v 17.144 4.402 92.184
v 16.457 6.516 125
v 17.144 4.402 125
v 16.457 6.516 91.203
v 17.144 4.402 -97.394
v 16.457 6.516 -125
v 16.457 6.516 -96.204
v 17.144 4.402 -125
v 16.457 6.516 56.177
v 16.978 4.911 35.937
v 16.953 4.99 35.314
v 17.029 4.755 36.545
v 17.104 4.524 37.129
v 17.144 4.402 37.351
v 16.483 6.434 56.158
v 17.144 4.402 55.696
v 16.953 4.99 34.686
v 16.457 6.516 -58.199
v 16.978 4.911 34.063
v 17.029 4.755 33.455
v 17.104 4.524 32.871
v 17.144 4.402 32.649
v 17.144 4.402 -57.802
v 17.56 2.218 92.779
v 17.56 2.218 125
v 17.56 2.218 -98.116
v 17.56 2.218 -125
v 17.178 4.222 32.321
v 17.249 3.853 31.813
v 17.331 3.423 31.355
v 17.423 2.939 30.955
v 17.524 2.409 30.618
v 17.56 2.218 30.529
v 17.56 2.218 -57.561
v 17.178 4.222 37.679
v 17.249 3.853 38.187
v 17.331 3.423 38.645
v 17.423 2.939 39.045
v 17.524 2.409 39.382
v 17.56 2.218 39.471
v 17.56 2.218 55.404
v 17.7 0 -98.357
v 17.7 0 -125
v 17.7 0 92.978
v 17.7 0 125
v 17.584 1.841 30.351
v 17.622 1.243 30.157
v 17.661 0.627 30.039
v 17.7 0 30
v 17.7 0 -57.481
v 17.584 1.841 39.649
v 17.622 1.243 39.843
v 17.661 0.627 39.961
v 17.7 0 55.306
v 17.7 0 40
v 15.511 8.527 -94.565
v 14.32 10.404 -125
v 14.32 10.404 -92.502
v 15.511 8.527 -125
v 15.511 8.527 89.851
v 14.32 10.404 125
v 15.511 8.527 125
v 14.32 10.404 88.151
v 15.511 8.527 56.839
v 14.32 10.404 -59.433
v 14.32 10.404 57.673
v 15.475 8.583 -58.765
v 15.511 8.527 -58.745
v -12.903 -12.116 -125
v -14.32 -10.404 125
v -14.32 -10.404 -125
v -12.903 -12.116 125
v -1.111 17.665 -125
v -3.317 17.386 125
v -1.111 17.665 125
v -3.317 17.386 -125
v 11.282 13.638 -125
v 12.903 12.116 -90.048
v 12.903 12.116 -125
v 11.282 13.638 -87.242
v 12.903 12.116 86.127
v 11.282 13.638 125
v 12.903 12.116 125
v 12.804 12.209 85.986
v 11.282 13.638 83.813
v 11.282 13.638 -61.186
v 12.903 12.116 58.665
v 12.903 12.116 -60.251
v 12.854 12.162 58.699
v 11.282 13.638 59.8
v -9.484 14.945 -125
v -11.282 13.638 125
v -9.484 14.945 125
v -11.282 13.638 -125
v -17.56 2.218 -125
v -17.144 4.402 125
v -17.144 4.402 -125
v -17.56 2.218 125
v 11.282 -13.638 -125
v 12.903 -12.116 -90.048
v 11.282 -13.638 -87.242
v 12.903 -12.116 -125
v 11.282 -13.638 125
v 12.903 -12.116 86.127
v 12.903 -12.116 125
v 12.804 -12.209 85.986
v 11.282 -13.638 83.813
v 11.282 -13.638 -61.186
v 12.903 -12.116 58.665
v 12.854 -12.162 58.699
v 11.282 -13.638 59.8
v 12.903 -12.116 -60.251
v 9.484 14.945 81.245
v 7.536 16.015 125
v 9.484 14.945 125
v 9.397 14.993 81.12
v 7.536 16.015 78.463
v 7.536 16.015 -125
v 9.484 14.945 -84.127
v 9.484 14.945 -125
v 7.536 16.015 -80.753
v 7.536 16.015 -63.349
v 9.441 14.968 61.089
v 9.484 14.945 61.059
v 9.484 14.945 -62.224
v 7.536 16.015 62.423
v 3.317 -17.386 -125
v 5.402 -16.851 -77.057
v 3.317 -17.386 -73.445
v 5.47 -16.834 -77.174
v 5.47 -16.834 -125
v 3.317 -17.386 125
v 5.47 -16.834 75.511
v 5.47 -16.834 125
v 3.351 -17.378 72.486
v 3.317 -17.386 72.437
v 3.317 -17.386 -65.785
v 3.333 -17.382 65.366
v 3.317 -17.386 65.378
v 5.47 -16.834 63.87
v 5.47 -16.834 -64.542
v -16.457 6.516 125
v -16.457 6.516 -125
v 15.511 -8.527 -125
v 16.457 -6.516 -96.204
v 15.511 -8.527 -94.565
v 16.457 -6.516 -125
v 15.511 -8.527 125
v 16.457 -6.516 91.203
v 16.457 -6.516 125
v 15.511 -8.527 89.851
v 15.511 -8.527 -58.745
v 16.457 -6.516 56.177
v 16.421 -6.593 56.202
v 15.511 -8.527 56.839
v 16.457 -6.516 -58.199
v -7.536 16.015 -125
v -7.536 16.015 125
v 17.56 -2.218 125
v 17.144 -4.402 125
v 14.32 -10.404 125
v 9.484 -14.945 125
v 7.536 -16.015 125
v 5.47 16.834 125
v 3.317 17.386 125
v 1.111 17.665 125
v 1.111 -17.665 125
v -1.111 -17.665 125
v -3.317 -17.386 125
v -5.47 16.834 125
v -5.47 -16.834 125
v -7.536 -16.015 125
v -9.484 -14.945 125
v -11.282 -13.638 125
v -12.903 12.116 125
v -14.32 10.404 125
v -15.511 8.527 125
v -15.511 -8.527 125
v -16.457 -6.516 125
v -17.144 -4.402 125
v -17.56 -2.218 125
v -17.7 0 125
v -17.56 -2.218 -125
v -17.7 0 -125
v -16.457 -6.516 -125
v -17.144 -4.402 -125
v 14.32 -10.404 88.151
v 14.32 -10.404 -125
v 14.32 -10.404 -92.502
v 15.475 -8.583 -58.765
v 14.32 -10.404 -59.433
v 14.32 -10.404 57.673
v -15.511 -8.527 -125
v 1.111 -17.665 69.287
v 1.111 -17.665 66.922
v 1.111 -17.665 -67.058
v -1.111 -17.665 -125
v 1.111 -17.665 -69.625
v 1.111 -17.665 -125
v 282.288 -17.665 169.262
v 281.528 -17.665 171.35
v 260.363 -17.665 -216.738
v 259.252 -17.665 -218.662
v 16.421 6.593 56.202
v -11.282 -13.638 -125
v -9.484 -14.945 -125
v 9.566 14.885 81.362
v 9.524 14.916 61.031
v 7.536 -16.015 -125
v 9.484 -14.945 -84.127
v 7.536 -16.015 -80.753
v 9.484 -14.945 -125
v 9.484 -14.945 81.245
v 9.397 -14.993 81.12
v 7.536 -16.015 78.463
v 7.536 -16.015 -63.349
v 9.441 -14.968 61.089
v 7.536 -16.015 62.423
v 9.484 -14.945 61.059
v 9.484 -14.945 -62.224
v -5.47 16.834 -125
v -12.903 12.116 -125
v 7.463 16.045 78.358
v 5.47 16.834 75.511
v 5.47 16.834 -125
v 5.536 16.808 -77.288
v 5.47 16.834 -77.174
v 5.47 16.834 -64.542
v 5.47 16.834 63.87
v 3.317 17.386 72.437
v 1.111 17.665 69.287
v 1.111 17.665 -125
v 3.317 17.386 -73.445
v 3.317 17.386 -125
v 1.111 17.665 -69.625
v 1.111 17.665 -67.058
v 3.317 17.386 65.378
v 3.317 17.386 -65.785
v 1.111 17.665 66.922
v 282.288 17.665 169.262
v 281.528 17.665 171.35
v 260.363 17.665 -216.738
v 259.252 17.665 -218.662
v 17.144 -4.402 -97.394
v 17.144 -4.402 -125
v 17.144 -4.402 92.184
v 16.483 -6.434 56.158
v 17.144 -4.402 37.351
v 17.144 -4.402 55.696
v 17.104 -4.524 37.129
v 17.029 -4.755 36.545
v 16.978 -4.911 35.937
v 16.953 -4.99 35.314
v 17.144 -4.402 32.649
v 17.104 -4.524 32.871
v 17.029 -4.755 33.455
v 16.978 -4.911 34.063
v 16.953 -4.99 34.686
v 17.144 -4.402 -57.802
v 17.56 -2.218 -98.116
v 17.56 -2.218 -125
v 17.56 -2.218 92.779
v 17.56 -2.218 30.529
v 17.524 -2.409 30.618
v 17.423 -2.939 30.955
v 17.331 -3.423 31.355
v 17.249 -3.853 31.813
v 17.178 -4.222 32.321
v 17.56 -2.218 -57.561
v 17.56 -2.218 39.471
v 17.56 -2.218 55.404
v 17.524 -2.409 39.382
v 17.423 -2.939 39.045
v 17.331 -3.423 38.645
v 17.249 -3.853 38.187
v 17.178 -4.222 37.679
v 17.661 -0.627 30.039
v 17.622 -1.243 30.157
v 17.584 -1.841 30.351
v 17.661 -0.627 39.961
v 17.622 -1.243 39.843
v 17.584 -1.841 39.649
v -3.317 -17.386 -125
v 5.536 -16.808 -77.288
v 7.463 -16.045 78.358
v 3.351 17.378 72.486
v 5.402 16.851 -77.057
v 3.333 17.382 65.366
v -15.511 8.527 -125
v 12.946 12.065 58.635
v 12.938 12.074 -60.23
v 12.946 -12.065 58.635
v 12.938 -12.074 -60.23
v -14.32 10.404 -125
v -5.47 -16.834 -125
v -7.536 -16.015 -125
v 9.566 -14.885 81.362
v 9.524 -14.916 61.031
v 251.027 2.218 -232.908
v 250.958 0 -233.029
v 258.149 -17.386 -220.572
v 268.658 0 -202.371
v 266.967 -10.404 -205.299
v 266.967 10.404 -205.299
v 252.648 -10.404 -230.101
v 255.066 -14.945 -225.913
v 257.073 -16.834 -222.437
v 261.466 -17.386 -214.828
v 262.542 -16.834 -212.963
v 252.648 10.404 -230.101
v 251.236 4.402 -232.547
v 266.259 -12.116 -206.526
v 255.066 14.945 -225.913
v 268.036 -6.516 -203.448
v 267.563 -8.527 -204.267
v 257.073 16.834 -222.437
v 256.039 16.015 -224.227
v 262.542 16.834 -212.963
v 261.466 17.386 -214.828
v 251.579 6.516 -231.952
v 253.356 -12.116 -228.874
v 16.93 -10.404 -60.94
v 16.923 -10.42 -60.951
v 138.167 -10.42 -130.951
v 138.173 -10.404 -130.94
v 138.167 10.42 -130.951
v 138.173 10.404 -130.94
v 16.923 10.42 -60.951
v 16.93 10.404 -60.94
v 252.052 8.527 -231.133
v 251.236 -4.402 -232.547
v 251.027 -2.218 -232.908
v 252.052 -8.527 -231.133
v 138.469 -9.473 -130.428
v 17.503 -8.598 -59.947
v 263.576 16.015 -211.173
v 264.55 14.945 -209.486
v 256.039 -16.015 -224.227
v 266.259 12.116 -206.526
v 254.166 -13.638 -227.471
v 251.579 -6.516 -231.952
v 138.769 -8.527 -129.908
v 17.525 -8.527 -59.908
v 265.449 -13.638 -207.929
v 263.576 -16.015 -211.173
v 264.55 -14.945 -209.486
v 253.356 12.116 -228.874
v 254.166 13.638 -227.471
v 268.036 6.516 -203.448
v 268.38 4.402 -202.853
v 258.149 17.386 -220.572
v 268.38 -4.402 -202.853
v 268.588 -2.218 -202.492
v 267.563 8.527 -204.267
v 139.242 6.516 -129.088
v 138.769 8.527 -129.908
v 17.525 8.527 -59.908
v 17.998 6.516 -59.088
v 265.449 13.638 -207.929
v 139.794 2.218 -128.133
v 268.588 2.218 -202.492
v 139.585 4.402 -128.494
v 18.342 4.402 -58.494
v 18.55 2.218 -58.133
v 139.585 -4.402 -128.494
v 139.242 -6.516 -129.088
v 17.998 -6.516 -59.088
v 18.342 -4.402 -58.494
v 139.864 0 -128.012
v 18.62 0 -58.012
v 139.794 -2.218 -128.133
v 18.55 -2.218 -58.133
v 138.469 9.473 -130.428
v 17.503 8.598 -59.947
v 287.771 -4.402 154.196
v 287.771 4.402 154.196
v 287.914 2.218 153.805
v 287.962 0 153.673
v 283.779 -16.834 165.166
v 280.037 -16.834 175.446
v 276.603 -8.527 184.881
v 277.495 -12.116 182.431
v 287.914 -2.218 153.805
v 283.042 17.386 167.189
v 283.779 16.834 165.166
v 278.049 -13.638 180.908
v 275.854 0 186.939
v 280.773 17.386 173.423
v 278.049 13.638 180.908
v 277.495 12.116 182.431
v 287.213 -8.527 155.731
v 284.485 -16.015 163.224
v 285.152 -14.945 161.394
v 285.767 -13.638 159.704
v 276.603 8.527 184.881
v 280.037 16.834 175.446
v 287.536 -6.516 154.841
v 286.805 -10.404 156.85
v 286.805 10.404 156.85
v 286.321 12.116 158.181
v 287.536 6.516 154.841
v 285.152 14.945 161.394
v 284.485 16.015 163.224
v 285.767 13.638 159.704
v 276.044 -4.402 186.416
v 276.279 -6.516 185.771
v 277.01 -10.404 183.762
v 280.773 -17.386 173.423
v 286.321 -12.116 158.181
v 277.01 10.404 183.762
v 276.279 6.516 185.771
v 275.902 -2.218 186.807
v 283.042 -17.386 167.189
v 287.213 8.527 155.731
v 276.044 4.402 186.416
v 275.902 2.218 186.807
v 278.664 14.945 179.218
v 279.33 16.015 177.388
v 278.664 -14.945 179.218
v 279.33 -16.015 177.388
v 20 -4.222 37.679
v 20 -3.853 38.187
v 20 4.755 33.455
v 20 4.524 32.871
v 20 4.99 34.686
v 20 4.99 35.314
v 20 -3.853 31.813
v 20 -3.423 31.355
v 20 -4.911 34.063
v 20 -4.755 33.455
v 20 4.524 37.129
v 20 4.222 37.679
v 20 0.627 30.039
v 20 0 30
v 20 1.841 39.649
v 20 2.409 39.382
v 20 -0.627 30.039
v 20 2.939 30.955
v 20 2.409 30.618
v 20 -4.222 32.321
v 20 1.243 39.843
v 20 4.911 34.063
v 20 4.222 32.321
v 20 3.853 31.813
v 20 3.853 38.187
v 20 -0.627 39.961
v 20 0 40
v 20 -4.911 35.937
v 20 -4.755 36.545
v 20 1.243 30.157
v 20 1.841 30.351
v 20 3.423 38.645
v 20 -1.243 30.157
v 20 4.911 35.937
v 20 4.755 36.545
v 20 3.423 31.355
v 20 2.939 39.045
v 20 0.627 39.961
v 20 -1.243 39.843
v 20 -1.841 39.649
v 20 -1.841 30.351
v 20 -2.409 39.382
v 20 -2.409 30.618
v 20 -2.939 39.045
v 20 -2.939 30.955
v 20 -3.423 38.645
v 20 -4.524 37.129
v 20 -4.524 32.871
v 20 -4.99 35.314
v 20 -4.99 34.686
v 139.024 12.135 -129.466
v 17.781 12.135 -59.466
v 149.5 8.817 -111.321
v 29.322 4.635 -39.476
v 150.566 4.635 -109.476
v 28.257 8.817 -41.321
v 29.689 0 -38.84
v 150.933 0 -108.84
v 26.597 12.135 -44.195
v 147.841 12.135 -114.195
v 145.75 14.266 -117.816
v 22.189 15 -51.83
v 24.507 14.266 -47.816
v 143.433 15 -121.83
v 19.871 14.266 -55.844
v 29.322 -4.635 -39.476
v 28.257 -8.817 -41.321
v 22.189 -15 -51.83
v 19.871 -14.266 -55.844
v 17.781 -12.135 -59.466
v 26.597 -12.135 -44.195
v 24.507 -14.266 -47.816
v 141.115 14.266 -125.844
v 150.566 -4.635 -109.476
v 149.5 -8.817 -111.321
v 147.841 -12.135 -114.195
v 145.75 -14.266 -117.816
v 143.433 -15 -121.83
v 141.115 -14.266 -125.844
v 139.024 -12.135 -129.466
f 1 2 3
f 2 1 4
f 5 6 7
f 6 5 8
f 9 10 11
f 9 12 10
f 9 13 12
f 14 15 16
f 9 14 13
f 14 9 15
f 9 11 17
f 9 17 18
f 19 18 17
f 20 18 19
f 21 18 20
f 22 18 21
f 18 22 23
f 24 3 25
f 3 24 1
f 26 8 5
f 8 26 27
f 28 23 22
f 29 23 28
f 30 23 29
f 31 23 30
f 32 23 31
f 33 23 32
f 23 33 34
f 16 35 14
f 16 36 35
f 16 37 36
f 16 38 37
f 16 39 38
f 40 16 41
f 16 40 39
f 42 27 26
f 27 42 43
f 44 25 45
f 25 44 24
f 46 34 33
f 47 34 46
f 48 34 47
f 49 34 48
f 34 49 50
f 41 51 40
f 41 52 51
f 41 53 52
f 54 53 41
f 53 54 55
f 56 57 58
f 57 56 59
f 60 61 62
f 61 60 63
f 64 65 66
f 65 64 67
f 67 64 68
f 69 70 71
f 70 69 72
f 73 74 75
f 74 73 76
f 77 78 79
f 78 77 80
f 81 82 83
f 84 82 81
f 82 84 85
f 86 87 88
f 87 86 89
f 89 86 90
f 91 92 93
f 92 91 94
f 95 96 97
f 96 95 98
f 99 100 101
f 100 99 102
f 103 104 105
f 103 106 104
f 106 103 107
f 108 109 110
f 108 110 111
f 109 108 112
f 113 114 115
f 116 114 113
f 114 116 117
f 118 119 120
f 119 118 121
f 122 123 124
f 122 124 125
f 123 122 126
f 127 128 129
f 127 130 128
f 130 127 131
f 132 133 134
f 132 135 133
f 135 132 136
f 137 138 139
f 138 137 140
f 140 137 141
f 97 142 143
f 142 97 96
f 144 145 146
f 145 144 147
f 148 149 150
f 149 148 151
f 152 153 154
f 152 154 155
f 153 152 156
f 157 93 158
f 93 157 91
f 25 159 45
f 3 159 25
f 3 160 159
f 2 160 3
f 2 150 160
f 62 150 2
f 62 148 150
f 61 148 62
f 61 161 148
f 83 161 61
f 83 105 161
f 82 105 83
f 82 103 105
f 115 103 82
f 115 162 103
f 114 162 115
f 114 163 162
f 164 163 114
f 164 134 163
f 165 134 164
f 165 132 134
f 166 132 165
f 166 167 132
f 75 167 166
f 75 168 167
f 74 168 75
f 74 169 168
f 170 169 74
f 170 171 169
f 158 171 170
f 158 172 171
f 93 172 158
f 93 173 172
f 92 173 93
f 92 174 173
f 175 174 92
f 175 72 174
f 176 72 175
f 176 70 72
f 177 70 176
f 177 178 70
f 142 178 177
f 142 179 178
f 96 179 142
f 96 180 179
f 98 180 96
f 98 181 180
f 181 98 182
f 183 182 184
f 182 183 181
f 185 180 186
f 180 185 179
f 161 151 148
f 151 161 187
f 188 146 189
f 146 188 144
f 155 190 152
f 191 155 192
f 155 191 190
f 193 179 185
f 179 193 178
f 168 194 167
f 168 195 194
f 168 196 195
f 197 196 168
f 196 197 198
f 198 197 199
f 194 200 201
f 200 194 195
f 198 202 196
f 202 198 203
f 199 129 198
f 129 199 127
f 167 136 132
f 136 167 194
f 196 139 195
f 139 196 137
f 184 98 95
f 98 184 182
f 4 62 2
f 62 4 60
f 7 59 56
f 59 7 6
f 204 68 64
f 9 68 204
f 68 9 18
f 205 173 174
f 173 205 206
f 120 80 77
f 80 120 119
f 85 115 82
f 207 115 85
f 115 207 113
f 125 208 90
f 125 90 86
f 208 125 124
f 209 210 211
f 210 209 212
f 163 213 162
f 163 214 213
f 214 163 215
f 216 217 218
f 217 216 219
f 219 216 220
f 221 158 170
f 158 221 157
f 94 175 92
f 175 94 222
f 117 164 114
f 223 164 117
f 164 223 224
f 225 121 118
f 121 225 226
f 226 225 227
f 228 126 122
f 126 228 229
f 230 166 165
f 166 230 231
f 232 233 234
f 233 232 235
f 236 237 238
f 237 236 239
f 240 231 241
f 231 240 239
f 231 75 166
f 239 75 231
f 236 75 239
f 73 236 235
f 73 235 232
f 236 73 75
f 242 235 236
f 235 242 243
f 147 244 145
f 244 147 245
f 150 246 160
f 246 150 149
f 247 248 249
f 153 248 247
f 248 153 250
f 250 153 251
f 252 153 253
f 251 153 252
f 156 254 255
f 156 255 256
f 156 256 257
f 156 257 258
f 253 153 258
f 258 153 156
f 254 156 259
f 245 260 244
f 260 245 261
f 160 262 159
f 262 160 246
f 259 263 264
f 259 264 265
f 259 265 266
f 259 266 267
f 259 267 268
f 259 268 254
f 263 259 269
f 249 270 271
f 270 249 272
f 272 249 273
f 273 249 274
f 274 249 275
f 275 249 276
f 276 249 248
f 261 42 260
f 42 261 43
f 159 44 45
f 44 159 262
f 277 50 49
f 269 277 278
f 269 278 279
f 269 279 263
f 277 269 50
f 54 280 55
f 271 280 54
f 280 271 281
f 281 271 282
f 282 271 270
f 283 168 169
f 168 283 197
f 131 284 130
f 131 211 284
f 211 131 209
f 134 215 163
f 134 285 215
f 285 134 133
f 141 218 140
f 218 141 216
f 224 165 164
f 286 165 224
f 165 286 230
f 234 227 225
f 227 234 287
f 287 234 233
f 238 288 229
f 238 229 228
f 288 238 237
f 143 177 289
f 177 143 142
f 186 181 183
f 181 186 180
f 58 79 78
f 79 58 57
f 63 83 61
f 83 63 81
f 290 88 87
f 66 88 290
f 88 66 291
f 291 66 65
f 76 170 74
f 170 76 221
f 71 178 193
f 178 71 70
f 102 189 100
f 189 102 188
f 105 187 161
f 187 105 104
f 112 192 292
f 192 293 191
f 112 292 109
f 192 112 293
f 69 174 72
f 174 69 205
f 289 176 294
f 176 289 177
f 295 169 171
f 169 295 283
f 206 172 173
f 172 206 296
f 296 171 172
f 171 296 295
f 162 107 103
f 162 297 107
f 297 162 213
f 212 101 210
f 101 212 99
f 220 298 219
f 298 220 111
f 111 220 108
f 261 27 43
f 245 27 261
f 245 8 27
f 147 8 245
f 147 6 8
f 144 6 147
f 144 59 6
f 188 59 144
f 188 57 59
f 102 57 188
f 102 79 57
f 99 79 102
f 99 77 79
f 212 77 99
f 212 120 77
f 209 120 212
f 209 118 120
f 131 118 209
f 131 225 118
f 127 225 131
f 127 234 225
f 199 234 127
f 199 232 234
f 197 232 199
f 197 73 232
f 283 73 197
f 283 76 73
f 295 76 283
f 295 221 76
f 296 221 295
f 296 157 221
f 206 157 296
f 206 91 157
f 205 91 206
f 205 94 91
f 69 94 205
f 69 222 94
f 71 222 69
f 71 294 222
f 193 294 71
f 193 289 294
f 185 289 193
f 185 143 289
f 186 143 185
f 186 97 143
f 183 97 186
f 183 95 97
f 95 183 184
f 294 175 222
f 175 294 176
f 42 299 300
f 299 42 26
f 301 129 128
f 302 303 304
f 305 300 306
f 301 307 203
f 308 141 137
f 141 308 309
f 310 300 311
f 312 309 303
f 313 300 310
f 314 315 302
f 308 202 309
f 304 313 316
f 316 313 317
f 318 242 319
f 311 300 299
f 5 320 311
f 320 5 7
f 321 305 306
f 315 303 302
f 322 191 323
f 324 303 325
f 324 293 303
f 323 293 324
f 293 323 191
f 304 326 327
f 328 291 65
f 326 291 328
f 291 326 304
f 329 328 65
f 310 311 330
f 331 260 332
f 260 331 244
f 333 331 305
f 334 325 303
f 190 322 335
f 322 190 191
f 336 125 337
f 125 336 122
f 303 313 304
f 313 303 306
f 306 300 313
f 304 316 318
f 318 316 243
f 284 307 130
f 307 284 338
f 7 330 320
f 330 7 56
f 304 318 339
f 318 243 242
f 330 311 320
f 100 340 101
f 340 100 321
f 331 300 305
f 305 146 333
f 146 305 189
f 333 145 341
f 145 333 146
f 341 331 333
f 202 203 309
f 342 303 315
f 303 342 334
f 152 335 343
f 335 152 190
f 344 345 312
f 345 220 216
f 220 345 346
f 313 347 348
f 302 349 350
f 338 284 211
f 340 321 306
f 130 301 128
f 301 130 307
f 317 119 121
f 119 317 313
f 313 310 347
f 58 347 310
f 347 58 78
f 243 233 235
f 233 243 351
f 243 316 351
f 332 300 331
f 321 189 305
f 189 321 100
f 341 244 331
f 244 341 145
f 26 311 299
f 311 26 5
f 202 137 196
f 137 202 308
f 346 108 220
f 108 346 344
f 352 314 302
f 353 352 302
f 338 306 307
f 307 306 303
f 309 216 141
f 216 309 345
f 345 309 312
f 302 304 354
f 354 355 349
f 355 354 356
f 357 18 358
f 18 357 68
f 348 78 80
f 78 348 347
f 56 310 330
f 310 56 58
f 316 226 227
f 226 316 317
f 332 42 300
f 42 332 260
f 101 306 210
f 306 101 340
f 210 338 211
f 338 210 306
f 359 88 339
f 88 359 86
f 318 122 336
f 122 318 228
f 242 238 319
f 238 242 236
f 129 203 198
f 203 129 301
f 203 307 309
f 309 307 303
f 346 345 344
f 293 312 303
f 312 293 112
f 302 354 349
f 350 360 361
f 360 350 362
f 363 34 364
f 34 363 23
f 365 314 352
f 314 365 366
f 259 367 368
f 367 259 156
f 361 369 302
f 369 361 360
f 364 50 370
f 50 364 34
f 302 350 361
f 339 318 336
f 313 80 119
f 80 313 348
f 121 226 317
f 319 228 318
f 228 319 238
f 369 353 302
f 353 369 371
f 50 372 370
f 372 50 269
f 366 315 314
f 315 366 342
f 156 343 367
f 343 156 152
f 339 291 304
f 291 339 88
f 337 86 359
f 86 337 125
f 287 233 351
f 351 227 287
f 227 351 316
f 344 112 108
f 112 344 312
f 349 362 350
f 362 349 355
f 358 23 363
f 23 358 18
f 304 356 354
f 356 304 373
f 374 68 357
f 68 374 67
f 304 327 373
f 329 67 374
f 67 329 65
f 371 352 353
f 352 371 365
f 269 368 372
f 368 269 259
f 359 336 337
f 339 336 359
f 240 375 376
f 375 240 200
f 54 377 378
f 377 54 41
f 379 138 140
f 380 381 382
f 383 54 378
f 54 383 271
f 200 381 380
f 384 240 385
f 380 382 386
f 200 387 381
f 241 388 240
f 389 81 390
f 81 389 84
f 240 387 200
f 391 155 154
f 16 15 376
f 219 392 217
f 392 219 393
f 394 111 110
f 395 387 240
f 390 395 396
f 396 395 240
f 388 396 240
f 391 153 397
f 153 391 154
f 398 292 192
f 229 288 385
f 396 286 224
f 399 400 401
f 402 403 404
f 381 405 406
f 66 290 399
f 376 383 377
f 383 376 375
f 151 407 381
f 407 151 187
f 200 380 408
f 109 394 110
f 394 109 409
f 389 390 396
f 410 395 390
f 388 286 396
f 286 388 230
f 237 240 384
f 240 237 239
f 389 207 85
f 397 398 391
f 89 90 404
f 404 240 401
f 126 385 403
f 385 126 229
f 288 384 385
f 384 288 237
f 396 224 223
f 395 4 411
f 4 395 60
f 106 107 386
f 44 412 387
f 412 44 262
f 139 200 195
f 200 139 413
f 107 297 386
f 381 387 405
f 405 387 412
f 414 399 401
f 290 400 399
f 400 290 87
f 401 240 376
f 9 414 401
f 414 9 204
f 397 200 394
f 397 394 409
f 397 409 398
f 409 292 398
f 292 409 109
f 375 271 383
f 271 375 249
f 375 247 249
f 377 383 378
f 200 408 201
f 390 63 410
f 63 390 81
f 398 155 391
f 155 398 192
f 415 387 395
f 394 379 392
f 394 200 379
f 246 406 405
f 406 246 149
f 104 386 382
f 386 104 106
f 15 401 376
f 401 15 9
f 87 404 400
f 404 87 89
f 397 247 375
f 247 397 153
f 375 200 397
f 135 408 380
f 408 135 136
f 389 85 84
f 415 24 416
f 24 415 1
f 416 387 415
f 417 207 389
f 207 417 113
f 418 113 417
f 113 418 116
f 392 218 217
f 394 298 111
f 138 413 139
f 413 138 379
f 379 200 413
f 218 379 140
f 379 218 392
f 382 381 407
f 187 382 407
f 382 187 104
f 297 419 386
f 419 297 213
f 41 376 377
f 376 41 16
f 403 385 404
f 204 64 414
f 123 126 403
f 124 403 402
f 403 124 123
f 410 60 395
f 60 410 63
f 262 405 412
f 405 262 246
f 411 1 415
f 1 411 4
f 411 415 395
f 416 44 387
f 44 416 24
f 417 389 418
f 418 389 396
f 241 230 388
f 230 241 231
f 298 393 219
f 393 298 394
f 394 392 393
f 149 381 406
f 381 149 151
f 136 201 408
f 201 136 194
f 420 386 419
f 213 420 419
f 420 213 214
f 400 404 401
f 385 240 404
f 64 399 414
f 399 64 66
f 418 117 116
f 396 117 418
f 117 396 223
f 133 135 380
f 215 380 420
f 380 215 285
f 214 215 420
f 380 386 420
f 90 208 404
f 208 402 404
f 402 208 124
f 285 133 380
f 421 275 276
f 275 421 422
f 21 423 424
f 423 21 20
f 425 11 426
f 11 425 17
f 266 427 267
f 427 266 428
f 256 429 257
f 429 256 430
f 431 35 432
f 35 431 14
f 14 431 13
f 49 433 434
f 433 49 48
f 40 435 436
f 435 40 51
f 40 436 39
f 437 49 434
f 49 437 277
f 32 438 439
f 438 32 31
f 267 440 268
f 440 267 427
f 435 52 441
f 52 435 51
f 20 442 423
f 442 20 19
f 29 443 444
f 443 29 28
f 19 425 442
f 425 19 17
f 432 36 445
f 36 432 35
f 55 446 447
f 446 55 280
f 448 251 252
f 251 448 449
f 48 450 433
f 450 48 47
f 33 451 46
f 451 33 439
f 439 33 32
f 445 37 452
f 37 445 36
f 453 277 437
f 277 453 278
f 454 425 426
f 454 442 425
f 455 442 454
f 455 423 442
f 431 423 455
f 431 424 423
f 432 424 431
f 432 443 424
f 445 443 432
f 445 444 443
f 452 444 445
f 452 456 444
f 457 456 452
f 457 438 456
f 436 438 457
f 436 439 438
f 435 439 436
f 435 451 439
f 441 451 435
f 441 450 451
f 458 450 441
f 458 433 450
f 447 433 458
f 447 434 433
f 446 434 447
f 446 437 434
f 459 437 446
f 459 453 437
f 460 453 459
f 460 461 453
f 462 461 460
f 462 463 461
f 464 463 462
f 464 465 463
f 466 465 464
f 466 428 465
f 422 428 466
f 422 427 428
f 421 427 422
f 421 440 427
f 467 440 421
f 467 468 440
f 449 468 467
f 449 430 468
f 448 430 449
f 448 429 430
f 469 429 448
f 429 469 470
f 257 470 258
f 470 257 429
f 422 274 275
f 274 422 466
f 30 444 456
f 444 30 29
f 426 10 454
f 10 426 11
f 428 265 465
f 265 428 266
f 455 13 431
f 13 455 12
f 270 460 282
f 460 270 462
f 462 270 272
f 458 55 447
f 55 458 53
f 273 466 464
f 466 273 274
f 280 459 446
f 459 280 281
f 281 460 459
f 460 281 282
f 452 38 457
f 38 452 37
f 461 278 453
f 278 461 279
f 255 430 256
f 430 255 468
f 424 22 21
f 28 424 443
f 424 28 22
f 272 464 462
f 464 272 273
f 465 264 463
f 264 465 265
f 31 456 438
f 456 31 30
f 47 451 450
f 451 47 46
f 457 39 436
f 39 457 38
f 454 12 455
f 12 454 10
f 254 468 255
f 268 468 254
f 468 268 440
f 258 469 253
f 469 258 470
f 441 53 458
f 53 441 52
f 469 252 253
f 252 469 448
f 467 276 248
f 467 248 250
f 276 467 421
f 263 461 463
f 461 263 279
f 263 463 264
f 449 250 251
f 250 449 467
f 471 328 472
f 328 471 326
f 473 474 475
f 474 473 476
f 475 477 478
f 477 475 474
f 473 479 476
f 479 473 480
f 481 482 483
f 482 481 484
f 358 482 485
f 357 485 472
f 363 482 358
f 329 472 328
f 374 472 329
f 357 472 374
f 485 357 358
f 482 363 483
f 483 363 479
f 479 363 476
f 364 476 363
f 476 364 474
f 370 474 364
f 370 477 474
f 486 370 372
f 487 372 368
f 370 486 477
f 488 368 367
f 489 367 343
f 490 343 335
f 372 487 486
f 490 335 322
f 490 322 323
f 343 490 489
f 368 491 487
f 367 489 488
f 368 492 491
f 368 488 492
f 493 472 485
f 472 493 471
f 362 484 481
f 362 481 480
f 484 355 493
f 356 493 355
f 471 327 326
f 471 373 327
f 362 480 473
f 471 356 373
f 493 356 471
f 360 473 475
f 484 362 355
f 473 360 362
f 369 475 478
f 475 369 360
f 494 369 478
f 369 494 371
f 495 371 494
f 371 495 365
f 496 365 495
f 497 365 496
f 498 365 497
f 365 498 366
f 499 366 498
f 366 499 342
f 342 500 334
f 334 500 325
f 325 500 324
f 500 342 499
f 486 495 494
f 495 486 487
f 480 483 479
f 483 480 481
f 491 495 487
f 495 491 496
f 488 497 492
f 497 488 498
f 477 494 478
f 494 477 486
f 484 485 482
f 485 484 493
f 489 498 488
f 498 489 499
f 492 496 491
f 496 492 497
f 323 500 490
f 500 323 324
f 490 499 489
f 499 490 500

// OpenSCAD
$fn=50;

// Lipo battery mockup
module lipo() {
  union() {
    color("green") cylinder(h=65.75, r=18.5/2, center=true);
    color("silver") translate([0,0,65.75/2]) cylinder(h=1, r=6/2, center=true);
  }
}

// Bike frame mock-up
rPipe = 35.4/2;
module bikeFrame() {
  color("DarkGray") union() {
    // Frame
    cylinder(h=250, r=rPipe, center=true);
    translate([0,0,-(50+rPipe)]) rotate([0,120,0]) cylinder(h=300, r=rPipe);
    translate([0,0, (50+rPipe)]) rotate([0, 70,0]) cylinder(h=300, r=rPipe);
    // Nipple
    translate([0,0, 50-15]) rotate([0, 90,0]) cylinder(h=20, r=5);
  }
}

// PCB mockup
module pcb(){
  translate([0,-24.2/2,-57.8/2]) union(){
    cube(size=[5.5,24.2,57.8]);
    translate([2,(24.2-16.5)/2,7]) cube(size=[2.6,16.5,57.8]);
    translate([-6,6.5,12.8]) cube(size=[6.1,12.5,12.5]);
    translate([-5,3,48.0]) cube(size=[5.1,16,9]);
  }
}

module lipoCase(){
  #translate([-5,0,-105]) cylinder(h=140, r=15, center=false, $fn=20);
  lipo();
  translate([0,0,-67]) lipo();
}

bikeFrame();

translate([55, 0, -65]) rotate([0, -60, 0]) lipoCase();
